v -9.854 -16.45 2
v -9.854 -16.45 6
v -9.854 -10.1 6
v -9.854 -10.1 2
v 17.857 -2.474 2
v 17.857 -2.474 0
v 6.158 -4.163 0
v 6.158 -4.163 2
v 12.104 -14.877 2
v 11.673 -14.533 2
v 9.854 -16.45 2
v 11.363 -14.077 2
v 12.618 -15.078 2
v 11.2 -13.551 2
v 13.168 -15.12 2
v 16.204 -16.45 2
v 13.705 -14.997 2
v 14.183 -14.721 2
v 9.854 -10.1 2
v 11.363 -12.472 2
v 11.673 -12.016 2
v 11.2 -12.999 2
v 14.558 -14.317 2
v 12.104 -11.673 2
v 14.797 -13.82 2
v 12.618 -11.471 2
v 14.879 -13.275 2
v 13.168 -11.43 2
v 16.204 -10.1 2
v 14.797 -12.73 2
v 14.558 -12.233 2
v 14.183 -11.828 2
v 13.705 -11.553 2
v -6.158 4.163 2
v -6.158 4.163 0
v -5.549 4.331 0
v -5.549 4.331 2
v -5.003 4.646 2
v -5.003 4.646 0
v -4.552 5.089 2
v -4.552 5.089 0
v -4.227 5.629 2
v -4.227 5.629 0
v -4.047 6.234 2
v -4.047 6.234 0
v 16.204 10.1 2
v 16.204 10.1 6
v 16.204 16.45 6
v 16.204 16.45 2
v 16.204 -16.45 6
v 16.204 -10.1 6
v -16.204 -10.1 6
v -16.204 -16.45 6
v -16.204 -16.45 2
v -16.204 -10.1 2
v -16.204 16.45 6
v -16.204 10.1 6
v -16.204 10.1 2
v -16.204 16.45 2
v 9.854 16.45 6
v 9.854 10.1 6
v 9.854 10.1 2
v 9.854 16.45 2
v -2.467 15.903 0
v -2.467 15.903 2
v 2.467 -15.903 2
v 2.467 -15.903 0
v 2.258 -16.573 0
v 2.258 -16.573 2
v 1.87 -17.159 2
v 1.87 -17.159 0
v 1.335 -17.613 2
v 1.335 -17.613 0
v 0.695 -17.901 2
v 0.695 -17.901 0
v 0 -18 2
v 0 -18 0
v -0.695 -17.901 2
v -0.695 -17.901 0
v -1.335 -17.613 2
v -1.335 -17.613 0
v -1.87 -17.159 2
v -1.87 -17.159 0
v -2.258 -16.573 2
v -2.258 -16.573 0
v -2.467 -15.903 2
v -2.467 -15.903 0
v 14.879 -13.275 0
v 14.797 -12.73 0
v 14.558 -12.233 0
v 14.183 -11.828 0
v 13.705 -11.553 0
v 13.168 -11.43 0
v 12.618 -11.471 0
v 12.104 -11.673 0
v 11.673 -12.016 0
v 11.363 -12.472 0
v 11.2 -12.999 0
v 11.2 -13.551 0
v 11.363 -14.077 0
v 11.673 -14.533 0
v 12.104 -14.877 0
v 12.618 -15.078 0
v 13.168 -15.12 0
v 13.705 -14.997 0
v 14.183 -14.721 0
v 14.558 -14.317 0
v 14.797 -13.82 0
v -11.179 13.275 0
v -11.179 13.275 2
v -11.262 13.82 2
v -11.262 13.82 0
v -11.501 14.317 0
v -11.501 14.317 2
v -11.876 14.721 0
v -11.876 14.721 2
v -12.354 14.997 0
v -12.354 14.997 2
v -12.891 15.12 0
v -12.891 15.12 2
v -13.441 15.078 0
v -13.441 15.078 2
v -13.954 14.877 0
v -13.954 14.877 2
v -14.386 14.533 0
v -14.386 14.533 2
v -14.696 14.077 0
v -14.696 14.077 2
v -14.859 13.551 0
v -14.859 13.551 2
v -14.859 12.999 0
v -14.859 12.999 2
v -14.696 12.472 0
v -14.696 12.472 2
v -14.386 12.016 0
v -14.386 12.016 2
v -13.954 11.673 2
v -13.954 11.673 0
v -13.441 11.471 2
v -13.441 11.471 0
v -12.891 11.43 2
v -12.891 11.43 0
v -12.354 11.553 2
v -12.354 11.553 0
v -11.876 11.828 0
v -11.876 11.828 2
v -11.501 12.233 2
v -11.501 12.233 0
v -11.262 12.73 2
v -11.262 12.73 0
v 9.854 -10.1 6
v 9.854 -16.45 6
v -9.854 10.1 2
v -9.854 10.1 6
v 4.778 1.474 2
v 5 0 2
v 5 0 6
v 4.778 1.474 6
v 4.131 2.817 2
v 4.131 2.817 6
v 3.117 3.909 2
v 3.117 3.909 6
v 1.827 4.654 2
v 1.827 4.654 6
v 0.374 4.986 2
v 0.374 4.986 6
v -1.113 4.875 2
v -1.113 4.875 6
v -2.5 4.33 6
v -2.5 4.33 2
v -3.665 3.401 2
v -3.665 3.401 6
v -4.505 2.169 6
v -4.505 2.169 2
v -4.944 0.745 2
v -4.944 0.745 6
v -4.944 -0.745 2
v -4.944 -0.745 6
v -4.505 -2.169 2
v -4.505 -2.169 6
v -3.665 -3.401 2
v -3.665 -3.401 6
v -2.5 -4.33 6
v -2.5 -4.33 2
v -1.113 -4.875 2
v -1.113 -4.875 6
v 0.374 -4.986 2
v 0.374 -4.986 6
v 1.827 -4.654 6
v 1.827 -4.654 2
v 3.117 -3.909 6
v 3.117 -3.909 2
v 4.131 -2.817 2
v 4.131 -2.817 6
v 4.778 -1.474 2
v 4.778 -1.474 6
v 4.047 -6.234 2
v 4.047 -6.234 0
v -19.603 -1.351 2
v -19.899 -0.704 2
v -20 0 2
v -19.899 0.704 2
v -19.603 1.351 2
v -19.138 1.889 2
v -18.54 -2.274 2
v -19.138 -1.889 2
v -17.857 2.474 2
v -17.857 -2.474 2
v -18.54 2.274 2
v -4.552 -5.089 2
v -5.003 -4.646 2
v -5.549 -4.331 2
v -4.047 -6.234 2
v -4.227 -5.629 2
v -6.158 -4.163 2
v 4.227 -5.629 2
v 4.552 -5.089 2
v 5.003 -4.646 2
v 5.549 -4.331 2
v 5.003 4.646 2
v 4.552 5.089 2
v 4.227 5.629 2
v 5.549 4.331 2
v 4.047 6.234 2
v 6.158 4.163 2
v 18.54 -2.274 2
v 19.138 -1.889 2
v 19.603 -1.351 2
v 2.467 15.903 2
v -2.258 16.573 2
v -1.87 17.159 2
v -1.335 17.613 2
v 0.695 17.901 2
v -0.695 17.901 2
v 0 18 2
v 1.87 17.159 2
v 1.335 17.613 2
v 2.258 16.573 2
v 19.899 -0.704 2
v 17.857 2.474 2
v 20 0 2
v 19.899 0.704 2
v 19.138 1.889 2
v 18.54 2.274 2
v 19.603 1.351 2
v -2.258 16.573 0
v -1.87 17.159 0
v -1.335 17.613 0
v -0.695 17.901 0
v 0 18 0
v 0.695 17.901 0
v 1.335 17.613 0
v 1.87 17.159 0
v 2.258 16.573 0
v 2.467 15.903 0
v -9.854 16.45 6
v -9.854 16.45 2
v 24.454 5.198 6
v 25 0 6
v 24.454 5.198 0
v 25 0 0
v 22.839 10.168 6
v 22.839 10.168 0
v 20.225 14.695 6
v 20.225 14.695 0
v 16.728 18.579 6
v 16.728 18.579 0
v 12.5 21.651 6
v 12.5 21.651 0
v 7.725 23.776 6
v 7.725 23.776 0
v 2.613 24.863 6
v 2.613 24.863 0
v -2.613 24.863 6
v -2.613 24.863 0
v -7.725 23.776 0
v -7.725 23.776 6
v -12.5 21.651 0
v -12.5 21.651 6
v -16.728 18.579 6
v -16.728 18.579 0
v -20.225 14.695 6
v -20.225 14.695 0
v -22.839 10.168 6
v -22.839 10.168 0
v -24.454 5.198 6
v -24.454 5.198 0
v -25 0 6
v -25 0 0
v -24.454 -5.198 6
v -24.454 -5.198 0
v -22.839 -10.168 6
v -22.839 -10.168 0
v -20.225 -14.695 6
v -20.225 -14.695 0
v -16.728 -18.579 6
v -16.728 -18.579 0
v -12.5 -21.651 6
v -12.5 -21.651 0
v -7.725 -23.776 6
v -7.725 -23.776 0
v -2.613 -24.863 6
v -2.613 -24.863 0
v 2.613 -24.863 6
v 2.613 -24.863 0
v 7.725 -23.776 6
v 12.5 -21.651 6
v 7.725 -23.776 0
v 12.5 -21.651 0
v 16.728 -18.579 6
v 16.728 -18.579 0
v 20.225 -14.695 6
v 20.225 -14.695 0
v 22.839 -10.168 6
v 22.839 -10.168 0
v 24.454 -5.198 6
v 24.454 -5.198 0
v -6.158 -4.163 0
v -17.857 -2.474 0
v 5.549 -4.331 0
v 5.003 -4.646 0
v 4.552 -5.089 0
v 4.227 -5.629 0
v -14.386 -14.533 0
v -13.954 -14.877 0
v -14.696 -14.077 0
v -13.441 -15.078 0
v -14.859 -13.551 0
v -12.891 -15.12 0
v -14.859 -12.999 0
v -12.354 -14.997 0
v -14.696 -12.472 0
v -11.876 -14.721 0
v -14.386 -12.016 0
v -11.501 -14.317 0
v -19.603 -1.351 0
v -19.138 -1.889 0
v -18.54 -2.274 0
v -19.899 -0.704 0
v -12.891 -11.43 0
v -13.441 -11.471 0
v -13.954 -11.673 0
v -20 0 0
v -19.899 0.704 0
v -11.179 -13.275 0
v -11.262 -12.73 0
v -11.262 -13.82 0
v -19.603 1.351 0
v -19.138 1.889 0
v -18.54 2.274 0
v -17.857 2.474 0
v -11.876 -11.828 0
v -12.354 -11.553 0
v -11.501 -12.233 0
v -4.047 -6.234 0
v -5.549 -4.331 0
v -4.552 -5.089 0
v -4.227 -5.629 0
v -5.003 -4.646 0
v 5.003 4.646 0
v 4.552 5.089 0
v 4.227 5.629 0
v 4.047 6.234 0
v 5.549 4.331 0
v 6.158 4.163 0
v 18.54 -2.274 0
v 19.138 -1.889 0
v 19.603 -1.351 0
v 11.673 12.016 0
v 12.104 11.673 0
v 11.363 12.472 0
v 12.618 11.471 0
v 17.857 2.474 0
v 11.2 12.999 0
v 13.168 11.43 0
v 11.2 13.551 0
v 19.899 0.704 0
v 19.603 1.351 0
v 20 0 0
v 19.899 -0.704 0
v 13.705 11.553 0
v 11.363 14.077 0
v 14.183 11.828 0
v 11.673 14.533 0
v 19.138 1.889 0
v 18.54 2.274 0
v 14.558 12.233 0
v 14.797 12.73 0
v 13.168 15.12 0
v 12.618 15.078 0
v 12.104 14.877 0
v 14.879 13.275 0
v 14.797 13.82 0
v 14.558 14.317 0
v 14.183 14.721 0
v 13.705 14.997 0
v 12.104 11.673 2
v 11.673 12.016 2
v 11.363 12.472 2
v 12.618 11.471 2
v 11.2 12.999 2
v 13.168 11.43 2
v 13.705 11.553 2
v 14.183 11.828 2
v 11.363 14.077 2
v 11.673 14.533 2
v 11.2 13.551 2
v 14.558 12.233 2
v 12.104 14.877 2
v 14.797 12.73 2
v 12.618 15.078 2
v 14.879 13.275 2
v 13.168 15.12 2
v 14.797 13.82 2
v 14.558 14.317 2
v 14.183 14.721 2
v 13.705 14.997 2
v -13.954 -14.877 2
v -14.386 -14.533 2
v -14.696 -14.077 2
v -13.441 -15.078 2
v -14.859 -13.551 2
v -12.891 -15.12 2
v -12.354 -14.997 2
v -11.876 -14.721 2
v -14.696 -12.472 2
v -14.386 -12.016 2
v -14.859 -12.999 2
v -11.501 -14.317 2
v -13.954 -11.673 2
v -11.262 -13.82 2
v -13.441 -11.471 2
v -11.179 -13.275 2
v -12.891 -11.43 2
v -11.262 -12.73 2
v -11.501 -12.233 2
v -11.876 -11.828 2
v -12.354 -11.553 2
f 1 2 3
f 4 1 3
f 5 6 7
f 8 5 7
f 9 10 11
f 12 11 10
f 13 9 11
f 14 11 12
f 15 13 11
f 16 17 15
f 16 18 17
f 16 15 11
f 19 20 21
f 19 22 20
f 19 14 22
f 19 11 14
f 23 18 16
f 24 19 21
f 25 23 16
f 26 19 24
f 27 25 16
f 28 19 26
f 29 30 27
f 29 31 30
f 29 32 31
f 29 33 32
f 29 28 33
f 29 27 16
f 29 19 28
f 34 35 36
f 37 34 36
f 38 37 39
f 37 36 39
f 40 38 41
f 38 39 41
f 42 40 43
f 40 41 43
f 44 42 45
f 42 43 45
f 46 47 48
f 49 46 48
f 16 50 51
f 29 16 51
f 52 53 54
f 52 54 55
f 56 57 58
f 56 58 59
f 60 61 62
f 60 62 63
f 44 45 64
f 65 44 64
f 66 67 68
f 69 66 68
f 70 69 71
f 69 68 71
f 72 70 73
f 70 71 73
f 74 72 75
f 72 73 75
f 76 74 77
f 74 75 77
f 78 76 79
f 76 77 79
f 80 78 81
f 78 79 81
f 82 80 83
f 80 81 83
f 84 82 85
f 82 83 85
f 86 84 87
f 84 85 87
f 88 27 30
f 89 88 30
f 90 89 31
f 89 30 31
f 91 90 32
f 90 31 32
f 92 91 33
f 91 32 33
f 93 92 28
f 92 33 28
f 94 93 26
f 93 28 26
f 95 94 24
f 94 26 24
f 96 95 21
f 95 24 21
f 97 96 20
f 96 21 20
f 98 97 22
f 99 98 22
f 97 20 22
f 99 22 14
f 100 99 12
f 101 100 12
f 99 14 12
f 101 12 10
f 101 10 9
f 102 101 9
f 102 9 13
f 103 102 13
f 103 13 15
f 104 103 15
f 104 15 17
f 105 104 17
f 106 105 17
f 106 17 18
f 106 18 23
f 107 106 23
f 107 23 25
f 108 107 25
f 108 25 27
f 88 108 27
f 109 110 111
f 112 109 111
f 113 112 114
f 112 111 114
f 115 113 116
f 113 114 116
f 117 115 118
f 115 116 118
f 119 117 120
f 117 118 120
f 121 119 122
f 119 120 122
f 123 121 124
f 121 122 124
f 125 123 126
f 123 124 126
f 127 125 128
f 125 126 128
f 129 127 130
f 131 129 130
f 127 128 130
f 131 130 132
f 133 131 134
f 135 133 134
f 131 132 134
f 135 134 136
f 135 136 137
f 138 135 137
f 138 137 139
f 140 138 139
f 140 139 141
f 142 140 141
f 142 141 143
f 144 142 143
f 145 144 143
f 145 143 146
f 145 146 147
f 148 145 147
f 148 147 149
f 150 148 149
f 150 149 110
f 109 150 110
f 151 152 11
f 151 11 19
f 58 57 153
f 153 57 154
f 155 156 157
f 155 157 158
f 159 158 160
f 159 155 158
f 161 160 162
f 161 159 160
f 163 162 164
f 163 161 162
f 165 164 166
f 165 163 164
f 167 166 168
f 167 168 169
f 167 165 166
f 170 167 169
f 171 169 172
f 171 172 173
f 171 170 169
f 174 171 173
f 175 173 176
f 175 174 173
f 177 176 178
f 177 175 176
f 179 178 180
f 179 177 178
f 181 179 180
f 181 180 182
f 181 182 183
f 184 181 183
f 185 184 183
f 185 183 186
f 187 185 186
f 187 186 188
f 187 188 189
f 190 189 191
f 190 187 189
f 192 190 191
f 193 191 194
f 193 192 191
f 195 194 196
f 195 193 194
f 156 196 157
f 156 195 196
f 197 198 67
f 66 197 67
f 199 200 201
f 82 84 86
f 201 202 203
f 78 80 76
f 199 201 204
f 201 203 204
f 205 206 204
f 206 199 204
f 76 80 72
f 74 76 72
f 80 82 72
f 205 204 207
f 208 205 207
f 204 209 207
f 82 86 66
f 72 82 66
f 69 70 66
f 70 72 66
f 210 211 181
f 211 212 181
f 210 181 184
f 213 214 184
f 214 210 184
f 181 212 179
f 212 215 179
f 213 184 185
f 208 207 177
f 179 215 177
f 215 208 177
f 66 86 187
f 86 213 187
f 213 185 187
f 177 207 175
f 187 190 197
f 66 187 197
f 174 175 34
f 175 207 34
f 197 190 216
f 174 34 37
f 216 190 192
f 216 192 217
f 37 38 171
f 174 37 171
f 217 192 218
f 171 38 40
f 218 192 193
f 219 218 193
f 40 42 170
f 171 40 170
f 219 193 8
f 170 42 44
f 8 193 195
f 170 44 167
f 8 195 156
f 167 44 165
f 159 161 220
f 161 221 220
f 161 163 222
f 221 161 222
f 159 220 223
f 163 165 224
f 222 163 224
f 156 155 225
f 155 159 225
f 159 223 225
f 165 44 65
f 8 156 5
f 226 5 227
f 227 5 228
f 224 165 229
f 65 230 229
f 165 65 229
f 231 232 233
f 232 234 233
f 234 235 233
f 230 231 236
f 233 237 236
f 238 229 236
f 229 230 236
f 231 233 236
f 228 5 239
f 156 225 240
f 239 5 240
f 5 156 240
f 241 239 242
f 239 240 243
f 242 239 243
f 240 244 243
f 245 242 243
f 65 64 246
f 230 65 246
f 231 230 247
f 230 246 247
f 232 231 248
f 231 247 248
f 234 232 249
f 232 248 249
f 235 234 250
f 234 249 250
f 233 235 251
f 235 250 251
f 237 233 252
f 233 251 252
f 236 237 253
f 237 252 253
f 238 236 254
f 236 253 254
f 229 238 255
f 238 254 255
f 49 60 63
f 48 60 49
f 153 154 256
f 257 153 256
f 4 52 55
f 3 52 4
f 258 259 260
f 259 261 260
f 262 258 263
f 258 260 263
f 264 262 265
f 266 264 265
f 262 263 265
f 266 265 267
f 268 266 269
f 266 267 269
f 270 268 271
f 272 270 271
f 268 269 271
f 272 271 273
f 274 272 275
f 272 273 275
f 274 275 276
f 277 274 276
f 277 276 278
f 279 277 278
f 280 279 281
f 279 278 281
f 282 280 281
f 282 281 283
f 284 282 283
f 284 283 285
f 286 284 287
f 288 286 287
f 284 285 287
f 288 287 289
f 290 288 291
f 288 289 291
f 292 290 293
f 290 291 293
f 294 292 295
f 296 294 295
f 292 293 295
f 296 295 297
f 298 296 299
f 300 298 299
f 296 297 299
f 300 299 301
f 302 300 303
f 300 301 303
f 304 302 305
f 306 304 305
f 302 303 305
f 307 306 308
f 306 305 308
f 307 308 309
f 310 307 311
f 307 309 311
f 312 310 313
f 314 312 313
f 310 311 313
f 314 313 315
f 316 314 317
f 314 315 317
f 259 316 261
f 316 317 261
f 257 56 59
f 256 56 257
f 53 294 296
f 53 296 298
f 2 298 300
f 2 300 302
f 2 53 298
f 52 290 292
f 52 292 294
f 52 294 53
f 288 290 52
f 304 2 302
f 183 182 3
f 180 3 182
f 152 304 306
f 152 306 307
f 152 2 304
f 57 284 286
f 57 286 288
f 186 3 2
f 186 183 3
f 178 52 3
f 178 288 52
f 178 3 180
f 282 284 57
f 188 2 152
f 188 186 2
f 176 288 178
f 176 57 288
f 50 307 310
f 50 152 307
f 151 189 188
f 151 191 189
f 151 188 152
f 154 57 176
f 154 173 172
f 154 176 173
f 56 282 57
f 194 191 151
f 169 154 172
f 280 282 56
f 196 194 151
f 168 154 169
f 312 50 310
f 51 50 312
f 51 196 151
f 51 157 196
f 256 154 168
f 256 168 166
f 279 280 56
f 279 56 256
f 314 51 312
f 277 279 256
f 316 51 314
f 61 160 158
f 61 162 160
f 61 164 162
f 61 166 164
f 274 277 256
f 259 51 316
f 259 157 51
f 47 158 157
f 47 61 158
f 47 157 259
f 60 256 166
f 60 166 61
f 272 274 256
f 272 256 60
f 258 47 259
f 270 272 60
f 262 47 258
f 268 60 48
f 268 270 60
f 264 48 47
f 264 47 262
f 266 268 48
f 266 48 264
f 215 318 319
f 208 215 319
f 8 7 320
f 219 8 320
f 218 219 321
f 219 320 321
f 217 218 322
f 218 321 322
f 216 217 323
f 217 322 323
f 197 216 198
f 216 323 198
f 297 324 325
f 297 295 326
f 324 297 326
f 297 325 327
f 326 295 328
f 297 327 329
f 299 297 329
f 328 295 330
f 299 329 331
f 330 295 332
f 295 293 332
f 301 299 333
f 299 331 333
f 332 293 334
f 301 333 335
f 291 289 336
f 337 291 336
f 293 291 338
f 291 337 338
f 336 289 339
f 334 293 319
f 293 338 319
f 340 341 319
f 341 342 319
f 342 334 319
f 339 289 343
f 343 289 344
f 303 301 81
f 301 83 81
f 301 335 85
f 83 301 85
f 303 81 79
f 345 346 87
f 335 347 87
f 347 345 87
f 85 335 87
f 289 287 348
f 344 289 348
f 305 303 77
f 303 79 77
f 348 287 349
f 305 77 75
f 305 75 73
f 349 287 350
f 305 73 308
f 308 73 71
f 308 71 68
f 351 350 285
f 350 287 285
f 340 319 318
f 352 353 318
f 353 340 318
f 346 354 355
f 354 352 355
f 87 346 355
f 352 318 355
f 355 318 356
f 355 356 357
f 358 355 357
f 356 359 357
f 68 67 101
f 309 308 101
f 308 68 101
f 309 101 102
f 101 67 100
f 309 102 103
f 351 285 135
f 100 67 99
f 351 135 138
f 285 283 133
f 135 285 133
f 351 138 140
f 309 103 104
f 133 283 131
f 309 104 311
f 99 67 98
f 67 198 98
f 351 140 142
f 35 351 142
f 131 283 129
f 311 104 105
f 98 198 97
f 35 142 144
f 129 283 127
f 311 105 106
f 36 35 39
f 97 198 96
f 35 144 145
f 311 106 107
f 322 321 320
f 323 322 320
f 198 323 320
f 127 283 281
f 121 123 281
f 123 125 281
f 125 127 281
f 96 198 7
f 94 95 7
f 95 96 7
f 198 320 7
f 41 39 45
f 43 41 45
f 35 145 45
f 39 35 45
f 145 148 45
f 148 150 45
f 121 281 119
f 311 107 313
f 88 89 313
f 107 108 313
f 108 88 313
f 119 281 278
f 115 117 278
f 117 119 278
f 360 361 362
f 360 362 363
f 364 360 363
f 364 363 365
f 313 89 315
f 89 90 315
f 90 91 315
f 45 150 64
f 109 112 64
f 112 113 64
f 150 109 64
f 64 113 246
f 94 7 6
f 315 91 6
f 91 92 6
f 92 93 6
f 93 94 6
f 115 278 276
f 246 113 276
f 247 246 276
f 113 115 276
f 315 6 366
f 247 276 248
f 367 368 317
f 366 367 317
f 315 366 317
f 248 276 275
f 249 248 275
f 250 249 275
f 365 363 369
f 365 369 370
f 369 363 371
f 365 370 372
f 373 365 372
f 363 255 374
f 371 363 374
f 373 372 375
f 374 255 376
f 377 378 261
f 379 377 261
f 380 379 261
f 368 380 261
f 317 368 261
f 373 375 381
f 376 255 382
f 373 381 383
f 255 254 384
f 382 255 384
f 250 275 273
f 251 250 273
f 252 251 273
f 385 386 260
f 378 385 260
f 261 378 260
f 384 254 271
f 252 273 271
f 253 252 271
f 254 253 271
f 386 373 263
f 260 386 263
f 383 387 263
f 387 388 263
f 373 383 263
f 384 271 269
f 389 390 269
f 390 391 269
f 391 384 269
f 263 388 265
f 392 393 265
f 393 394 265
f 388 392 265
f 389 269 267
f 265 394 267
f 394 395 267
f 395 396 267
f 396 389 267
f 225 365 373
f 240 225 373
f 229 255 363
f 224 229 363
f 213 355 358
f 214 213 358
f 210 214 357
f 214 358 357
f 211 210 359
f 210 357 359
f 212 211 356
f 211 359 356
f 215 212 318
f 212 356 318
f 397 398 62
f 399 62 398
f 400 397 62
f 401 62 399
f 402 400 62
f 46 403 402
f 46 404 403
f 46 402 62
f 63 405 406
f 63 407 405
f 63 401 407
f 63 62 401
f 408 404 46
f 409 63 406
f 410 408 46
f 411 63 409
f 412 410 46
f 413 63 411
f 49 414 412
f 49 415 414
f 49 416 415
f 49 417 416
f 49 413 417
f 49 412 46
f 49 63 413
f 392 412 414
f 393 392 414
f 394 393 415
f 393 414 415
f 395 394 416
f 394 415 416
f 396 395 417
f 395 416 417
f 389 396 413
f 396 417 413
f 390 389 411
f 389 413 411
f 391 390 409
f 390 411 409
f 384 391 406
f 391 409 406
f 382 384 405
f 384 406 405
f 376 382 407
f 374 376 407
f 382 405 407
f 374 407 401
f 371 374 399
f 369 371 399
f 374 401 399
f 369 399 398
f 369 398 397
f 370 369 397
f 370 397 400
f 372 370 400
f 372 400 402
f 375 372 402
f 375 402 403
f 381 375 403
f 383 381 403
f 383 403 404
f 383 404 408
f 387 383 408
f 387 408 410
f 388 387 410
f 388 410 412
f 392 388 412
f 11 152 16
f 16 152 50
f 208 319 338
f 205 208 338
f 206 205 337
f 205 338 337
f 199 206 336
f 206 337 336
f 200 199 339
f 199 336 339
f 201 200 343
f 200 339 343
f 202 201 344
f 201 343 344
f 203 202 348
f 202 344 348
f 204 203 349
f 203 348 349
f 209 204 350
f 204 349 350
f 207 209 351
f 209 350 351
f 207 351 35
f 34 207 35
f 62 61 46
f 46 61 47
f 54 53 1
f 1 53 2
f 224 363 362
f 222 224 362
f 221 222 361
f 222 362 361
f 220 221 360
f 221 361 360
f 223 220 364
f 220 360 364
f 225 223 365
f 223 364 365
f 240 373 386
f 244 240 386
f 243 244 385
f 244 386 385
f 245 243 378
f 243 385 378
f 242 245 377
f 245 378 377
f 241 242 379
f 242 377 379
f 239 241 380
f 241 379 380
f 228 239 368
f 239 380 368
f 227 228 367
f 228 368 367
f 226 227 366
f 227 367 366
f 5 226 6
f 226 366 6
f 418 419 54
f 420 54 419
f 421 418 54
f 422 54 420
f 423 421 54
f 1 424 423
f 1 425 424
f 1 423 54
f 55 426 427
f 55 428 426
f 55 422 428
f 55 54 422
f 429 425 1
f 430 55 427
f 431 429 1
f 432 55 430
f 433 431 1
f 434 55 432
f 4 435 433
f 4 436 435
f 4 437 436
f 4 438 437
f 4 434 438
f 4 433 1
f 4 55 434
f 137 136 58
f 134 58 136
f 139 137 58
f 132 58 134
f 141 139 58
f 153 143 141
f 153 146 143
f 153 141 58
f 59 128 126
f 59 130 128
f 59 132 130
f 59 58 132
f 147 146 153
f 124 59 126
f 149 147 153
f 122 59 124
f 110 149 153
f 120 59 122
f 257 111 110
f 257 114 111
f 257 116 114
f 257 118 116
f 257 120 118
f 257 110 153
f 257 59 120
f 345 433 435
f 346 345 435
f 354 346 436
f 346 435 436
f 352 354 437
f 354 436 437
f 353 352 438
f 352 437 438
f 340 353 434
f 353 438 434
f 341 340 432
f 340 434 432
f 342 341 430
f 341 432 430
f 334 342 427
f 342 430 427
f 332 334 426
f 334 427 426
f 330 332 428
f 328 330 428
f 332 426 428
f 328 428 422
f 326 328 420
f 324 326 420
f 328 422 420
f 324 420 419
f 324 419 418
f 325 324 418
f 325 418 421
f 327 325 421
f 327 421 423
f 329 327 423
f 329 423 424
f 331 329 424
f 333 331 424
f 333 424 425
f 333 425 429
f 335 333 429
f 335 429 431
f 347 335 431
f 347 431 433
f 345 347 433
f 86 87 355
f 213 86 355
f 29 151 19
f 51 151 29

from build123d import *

# Parameters (mm, degrees)
BOSS_EXTRUDE1_OUTLINE_R = 25
BOSS_EXTRUDE1_DEPTH     = 2
SKETCH4_R               = 25
SKETCH4_R_2             = 5
BOSS_EXTRUDE2_DEPTH     = 4
SKETCH5_R               = 1.85
CUT_EXTRUDE1_DEPTH      = 36.860842154
SKETCH6_R               = 3
CUT_EXTRUDE2_DEPTH      = 4
SKETCH7_W               = 6.35
SKETCH7_H               = 6.35
CUT_EXTRUDE3_DEPTH      = 4


# Read off the part's stored shape, not the designer's step: Boss-Extrude1
with BuildPart() as part:
    # Boss-Extrude1 outline → Boss-Extrude1 (new body)
    with BuildSketch(Plane.XY):
        Circle(BOSS_EXTRUDE1_OUTLINE_R)
        with BuildLine():
            ThreePointArc((4.047481829, 6.234173406), (4.763543773, 4.853224592), (6.157606479, 4.163040916))
            Line((6.157606479, 4.163040916), (17.857142857, 2.474358297))
            ThreePointArc((17.857142857, 2.474358297), (20, 0), (17.857142857, -2.474358297))
            Line((17.857142857, -2.474358297), (6.157606479, -4.163040916))
            ThreePointArc((6.157606479, -4.163040916), (4.763543773, -4.853224592), (4.047481829, -6.234173406))
            Line((4.047481829, -6.234173406), (2.467267507, -15.903225806))
            ThreePointArc((2.467267507, -15.903225806), (0, -18), (-2.467267507, -15.903225806))
            Line((-2.467267507, -15.903225806), (-4.047481829, -6.234173406))
            ThreePointArc((-4.047481829, -6.234173406), (-4.763543773, -4.853224592), (-6.157606479, -4.163040916))
            Line((-6.157606479, -4.163040916), (-17.857142857, -2.474358297))
            ThreePointArc((-17.857142857, -2.474358297), (-20, 0), (-17.857142857, 2.474358297))
            Line((-17.857142857, 2.474358297), (-6.157606479, 4.163040916))
            ThreePointArc((-6.157606479, 4.163040916), (-4.763543773, 4.853224592), (-4.047481829, 6.234173406))
            Line((-4.047481829, 6.234173406), (-2.467267507, 15.903225806))
            ThreePointArc((-2.467267507, 15.903225806), (0, 18), (2.467267507, 15.903225806))
            Line((2.467267507, 15.903225806), (4.047481829, 6.234173406))
        make_face(mode=Mode.SUBTRACT)
    extrude(amount=BOSS_EXTRUDE1_DEPTH)

    # Sketch4 → Boss-Extrude2 (add)
    with BuildSketch(Plane.XY.offset(2)):
        Circle(SKETCH4_R)
        Circle(SKETCH4_R_2, mode=Mode.SUBTRACT)
    extrude(amount=BOSS_EXTRUDE2_DEPTH)

    # Sketch5 → Cut-Extrude1 (cut, through all)
    with BuildSketch(Plane.XY.offset(6)):
        with Locations((13.029498672, 13.274798425)):
            Circle(SKETCH5_R)
        with Locations((-13.029498672, 13.274798425)):
            Circle(SKETCH5_R)
        with Locations((-13.029498672, -13.274798425)):
            Circle(SKETCH5_R)
        with Locations((13.029498672, -13.274798425)):
            Circle(SKETCH5_R)
    extrude(amount=-CUT_EXTRUDE1_DEPTH, mode=Mode.SUBTRACT)

    # Sketch6 → Cut-Extrude2 (cut)
    with BuildSketch(Plane.XY.offset(6)):
        with Locations((-13.029498672, -13.274798425)):
            Circle(SKETCH6_R)
        with Locations((13.029498672, -13.274798425)):
            Circle(SKETCH6_R)
        with Locations((13.029498672, 13.274798425)):
            Circle(SKETCH6_R)
        with Locations((-13.029498672, 13.274798425)):
            Circle(SKETCH6_R)
    extrude(amount=-CUT_EXTRUDE2_DEPTH, mode=Mode.SUBTRACT)

    # Sketch7 → Cut-Extrude3 (cut)
    with BuildSketch(Plane.XY.offset(6)):
        with Locations((13.029498672, 13.274798425)):
            Rectangle(SKETCH7_W, SKETCH7_H)
        with Locations((13.029498672, -13.274798425)):
            Rectangle(SKETCH7_W, SKETCH7_H)
        with Locations((-13.029498672, -13.274798425)):
            Rectangle(SKETCH7_W, SKETCH7_H)
        with Locations((-13.029498672, 13.274798425)):
            Rectangle(SKETCH7_W, SKETCH7_H)
    extrude(amount=-CUT_EXTRUDE3_DEPTH, mode=Mode.SUBTRACT)


solid = part.part
